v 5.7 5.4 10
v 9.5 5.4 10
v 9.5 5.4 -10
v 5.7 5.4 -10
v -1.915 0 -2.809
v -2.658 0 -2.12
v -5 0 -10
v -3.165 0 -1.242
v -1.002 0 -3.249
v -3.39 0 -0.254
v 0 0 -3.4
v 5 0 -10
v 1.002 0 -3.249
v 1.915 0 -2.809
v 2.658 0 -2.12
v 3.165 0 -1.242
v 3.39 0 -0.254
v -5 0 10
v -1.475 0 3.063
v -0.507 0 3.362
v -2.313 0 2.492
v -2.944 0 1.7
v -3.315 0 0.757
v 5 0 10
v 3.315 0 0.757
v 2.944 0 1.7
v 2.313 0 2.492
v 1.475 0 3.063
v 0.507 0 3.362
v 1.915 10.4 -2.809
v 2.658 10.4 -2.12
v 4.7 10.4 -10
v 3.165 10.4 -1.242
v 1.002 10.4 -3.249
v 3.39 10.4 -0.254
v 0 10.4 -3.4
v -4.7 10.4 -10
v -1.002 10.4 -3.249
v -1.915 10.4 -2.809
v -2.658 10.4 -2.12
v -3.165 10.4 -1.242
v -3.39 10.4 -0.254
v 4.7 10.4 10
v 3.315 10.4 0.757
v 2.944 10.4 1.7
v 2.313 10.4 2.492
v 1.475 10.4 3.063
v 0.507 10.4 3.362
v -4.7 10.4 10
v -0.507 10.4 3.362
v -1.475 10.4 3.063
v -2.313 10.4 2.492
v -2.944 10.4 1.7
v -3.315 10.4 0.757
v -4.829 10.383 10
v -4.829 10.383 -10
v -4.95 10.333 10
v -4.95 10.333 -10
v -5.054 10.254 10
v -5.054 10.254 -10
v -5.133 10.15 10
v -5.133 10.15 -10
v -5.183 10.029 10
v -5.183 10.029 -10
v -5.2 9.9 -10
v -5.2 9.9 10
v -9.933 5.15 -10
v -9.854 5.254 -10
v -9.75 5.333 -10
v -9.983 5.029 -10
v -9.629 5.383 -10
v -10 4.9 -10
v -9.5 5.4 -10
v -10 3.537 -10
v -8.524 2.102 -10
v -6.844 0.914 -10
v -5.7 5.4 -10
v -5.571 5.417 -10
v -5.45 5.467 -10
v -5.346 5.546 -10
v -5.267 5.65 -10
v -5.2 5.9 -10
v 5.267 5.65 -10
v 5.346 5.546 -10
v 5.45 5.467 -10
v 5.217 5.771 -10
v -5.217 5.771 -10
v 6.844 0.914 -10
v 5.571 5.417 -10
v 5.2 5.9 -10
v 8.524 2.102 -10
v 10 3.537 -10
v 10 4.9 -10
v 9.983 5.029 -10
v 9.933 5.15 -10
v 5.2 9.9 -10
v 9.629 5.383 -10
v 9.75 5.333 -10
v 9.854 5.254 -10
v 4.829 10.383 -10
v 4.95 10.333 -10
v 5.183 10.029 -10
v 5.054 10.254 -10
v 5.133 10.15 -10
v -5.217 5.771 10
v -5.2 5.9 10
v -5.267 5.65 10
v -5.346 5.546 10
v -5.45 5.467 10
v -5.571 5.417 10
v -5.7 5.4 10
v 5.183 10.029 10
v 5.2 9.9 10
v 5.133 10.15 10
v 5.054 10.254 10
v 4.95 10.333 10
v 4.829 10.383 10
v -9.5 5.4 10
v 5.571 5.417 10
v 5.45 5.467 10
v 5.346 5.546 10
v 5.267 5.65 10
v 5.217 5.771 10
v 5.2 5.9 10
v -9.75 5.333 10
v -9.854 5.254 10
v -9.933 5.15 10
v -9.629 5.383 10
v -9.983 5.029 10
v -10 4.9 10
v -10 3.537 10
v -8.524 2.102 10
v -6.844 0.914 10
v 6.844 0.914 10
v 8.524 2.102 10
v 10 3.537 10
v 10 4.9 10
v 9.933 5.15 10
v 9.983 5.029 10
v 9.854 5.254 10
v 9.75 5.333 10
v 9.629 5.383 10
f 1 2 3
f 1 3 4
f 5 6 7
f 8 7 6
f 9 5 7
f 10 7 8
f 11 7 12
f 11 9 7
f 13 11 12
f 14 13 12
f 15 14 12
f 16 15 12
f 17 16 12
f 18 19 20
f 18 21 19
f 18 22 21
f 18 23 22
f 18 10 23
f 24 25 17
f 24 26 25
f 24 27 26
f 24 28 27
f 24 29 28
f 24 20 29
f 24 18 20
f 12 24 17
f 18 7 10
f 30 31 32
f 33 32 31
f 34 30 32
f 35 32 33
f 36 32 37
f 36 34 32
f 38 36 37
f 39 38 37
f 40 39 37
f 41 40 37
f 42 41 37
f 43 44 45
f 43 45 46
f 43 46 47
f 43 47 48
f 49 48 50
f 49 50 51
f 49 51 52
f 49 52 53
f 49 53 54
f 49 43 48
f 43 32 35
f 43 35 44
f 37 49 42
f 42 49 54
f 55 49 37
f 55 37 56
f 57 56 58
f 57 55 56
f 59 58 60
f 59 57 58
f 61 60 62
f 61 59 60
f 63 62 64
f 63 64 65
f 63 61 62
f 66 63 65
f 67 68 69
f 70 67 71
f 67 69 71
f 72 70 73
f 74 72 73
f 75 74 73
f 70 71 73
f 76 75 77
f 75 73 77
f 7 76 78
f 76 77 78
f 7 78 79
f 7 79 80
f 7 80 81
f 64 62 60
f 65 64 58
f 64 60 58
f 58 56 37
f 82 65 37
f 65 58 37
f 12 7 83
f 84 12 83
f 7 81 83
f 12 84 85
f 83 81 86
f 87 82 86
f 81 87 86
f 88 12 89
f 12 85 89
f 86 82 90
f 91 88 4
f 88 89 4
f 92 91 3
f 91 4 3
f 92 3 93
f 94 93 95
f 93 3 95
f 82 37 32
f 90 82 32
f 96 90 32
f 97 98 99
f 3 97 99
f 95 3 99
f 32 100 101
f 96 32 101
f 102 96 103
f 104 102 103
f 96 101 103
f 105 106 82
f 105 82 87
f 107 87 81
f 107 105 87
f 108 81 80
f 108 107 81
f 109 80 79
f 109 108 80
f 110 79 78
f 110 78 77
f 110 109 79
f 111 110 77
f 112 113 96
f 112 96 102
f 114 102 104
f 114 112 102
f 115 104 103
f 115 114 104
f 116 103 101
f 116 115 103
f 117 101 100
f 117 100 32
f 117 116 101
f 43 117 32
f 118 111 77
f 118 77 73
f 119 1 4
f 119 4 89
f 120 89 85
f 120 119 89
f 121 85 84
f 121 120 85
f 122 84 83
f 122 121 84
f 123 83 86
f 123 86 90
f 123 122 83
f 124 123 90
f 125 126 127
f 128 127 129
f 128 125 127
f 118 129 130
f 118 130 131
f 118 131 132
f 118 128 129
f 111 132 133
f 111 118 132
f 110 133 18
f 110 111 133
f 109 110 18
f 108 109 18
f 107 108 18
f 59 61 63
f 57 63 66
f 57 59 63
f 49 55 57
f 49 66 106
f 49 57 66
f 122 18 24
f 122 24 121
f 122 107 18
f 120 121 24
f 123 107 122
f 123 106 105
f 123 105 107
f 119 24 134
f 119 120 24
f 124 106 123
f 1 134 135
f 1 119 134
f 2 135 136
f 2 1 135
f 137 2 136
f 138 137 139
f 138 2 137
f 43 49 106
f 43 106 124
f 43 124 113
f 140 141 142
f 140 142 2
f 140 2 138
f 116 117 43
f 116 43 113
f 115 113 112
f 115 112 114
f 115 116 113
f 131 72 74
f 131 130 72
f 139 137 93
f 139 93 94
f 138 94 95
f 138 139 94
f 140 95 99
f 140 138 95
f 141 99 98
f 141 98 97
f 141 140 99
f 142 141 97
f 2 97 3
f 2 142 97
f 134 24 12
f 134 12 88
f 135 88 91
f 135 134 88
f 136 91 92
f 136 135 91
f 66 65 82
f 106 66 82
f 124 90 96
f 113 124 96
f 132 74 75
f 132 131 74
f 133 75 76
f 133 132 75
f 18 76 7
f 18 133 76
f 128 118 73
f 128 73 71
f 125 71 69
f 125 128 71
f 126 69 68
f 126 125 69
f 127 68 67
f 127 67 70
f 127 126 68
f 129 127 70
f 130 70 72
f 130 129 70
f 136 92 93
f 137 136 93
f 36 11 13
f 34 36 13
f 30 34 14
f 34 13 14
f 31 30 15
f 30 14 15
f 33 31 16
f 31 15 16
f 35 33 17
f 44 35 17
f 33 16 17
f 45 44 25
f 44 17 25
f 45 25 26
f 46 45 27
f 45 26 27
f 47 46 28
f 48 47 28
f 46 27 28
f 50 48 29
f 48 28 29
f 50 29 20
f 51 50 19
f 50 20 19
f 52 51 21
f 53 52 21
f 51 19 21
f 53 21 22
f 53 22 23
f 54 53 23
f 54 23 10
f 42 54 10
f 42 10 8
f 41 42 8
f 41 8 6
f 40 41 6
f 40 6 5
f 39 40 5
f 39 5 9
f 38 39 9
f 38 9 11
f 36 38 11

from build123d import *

# Parameters (mm, degrees)
EXTRUDE_1_DEPTH        = 10
HOLE_WIZARD_M8_1_D     = 6.8
HOLE_WIZARD_M8_1_DEPTH = 19.75
HOLE_WIZARD_M8_1_TIP   = 2.042926105


with BuildPart() as part:
    # 草图1 → 凸台-拉伸1 (new, symmetric)
    with BuildSketch(Plane.XY):
        with BuildLine():
            Line((-5, 0), (5, 0))
            ThreePointArc((5, 0), (7.707230765, 1.475471539), (10, 3.53686037))
            Line((10, 3.53686037), (10, 4.9))
            ThreePointArc((10, 4.9), (9.853553391, 5.253553391), (9.5, 5.4))
            Line((9.5, 5.4), (5.7, 5.4))
            ThreePointArc((5.7, 5.4), (5.346446609, 5.546446609), (5.2, 5.9))
            Line((5.2, 5.9), (5.2, 9.9))
            ThreePointArc((5.2, 9.9), (5.053553391, 10.253553391), (4.7, 10.4))
            Line((4.7, 10.4), (-4.7, 10.4))
            ThreePointArc((-4.7, 10.4), (-5.053553391, 10.253553391), (-5.2, 9.9))
            Line((-5.2, 9.9), (-5.2, 5.9))
            ThreePointArc((-5.2, 5.9), (-5.346446609, 5.546446609), (-5.7, 5.4))
            Line((-5.7, 5.4), (-9.5, 5.4))
            ThreePointArc((-9.5, 5.4), (-9.853553391, 5.253553391), (-10, 4.9))
            Line((-10, 4.9), (-10, 3.53686037))
            ThreePointArc((-10, 3.53686037), (-7.707230765, 1.475471539), (-5, 0))
        make_face()
    extrude(amount=EXTRUDE_1_DEPTH, both=True)

    # M8 螺纹孔1
    with Locations(Plane.ZX.offset(10.4)):
        with Locations((0, 0)):
            Hole(HOLE_WIZARD_M8_1_D / 2, depth=HOLE_WIZARD_M8_1_DEPTH)
            with Locations((0, 0, -(HOLE_WIZARD_M8_1_DEPTH + HOLE_WIZARD_M8_1_TIP / 2))):  # 118° drill point
                Cone(0, HOLE_WIZARD_M8_1_D / 2, HOLE_WIZARD_M8_1_TIP, mode=Mode.SUBTRACT)


solid = part.part
